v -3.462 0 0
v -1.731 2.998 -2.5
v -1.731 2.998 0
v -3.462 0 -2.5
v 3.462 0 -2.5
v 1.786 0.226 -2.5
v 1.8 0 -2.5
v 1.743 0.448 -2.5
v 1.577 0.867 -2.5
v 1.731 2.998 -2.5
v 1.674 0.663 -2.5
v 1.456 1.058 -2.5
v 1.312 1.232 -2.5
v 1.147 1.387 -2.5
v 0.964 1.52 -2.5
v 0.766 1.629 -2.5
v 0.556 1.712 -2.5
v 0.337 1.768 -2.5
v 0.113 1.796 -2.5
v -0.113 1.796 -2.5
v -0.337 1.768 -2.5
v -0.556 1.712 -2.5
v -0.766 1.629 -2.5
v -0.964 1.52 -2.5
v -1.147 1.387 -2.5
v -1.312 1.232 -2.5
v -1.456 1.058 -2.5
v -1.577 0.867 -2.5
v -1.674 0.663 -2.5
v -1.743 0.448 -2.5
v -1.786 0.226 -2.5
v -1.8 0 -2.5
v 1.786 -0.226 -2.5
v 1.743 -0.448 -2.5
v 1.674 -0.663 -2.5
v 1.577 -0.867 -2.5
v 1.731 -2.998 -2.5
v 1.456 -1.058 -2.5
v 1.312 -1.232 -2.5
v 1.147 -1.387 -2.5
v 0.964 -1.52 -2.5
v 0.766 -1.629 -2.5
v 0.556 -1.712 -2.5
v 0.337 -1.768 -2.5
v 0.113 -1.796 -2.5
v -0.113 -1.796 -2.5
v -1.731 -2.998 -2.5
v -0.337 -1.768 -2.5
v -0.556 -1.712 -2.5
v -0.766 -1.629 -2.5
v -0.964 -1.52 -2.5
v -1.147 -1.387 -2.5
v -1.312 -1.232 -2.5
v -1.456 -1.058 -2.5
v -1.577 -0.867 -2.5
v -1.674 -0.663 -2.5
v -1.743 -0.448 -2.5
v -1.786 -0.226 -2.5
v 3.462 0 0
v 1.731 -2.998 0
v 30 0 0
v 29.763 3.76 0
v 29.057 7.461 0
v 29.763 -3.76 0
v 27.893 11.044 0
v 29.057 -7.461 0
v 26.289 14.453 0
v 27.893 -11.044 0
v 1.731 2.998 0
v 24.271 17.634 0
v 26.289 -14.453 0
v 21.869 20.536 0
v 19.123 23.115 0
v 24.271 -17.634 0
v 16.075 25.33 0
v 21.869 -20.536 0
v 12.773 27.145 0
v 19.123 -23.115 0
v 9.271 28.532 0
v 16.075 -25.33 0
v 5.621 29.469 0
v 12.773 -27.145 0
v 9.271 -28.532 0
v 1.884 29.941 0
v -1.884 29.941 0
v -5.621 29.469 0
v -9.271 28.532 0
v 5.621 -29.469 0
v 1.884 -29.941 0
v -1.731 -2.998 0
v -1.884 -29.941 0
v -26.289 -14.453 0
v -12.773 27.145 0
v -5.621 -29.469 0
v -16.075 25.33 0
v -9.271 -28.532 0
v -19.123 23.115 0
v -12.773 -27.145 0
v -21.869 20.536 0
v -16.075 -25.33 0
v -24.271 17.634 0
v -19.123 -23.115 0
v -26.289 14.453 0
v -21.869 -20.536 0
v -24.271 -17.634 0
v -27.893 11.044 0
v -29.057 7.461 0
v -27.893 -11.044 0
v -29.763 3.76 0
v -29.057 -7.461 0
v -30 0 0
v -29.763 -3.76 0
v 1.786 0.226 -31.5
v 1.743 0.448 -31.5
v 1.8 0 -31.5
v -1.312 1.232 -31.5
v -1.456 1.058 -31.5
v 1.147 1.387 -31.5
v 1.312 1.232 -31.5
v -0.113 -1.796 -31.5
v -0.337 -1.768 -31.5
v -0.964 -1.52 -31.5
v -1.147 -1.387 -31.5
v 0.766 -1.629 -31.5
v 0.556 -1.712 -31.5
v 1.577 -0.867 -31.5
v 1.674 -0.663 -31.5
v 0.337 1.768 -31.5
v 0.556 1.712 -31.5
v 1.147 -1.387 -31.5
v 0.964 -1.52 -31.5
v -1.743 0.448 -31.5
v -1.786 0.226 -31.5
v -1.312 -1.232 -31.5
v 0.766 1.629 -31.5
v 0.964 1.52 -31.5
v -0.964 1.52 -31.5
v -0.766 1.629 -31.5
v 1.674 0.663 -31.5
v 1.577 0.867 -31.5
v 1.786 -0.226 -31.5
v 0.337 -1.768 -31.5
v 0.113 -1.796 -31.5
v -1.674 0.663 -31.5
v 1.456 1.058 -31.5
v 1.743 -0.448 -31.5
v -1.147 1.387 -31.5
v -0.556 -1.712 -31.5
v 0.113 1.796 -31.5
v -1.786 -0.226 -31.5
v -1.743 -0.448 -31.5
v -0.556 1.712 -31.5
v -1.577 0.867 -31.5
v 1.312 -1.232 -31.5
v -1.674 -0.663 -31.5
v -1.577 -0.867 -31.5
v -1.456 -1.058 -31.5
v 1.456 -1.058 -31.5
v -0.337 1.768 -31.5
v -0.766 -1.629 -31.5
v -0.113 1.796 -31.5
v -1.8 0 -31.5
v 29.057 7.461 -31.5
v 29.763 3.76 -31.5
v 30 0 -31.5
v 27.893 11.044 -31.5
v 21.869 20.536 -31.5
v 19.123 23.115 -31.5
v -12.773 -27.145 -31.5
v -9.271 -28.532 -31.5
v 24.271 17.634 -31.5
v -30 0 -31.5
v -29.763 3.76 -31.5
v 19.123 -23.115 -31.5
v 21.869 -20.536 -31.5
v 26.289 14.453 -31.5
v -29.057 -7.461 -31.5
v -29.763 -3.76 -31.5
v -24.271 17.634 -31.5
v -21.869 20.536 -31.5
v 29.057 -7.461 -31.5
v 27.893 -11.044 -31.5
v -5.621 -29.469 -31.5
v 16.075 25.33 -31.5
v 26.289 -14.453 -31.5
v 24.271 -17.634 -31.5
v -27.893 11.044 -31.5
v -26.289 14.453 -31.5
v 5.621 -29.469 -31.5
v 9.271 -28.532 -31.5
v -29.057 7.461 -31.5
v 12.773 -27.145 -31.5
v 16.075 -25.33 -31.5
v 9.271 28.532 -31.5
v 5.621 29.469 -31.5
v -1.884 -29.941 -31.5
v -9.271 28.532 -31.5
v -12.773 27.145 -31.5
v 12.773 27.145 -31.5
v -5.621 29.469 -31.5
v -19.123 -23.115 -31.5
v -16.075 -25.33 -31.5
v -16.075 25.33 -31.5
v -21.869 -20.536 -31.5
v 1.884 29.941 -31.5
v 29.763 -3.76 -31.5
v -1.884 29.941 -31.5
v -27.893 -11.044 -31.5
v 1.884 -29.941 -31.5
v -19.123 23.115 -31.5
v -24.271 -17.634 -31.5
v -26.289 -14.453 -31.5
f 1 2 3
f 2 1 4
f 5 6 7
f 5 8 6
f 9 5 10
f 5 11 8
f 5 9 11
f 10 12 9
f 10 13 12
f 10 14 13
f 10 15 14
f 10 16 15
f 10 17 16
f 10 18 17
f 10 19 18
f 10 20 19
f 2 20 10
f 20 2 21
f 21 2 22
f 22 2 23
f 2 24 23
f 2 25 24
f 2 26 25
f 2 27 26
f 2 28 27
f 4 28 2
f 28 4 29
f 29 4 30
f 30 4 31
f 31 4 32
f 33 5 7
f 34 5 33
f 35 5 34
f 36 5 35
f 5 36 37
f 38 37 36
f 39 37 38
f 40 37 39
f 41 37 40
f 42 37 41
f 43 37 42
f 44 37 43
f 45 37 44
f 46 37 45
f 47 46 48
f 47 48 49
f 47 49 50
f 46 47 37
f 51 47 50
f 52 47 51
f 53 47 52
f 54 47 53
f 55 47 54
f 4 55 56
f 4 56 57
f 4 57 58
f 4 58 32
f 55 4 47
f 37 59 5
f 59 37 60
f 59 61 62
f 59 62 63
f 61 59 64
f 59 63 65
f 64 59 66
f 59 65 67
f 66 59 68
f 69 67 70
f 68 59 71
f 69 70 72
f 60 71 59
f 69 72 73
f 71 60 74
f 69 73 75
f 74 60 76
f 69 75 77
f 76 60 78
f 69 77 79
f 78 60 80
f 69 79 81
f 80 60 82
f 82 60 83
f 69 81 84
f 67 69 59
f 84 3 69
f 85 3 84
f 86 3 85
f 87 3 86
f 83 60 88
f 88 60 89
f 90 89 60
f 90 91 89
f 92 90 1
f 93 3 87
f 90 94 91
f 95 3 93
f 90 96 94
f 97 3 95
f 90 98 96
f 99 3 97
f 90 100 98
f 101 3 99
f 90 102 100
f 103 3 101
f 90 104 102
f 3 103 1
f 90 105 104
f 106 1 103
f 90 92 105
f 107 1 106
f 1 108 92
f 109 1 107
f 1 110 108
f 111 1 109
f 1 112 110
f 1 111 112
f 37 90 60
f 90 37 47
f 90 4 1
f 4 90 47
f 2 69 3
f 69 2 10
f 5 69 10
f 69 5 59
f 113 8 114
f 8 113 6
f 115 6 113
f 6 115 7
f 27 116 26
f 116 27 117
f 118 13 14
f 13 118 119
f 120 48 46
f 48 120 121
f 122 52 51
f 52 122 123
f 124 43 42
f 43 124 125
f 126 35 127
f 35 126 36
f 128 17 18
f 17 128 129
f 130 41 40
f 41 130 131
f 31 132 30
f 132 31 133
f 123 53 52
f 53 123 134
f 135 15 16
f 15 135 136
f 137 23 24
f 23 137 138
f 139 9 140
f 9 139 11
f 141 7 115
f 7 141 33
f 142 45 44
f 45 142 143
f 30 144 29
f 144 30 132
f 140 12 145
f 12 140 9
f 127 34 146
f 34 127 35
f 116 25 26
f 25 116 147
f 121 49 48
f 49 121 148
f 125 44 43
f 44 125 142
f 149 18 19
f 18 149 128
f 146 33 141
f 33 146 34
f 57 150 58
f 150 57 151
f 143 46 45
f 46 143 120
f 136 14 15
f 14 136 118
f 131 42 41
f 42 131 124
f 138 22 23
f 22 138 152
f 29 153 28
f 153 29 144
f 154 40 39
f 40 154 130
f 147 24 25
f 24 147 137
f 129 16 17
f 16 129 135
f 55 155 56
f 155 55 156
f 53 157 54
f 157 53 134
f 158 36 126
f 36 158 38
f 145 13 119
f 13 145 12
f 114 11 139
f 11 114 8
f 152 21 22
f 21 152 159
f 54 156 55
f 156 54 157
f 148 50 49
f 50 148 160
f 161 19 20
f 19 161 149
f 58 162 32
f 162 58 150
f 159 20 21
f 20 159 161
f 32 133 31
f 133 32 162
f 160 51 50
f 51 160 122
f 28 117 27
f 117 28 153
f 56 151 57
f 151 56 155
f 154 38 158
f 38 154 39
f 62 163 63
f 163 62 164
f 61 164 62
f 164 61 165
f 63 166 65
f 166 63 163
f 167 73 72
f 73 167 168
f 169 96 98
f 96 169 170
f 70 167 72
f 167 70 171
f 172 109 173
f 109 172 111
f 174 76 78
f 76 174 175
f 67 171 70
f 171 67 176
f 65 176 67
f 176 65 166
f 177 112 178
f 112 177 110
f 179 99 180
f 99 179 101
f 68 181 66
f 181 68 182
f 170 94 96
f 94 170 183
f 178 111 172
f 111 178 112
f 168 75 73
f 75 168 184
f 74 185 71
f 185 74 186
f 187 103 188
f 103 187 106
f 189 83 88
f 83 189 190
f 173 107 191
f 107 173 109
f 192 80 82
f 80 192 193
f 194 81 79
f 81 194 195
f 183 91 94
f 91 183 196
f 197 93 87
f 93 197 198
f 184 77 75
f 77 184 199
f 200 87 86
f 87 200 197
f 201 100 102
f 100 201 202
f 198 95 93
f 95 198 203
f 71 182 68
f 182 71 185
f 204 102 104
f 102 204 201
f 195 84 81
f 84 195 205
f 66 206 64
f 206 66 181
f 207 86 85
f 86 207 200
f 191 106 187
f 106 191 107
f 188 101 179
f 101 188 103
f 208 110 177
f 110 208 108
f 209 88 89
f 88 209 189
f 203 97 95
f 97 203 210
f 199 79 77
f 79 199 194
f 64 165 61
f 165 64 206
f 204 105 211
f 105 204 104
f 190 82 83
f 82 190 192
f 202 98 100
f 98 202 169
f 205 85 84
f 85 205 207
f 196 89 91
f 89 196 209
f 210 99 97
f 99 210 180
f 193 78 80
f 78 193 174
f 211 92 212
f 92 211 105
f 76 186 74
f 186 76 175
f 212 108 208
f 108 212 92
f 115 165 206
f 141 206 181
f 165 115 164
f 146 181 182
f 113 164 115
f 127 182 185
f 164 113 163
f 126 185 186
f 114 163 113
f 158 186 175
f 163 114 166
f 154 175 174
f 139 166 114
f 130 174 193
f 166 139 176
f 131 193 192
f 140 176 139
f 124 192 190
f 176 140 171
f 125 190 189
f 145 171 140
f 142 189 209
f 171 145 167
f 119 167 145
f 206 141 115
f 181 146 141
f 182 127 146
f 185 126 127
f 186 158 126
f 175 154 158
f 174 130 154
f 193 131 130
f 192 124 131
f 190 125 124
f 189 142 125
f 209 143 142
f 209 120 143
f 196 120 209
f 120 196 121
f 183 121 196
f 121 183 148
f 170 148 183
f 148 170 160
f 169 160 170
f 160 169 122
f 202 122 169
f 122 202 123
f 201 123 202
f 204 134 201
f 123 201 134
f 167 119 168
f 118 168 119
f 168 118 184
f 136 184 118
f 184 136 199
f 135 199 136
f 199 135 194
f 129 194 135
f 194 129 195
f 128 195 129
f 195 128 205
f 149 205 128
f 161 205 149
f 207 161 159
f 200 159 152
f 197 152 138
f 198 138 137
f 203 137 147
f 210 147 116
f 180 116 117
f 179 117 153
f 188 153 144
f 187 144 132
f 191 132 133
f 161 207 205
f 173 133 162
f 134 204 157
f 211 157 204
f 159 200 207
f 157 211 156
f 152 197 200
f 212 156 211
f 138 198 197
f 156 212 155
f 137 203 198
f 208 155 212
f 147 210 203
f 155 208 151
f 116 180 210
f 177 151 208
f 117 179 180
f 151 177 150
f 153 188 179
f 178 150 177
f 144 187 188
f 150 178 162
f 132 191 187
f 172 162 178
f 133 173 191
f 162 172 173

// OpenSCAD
$fn = 50;

difference() {
	union() {
		translate(v = [0, 0, -31.5]) {
			cylinder(h = 31.5, r = 30.0);
		}
	}
	union() {
		translate(v = [0, 0, 0]) {
			rotate(a = [0, 0, 0]) {
				difference() {
					union() {
						translate(v = [0, 0, -2.5]) {
							linear_extrude(height = 2.5) {
								polygon(points = [[3.4619999999999997, 0.0], [1.7310000000000003, 2.9981799479017264], [-1.7309999999999992, 2.9981799479017264], [-3.4619999999999997, 4.2397272186481365e-16], [-1.7310000000000014, -2.998179947901726], [1.7309999999999977, -2.9981799479017277]]);
							}
						}
					}
					union();
				}
			}
		}
		#translate(v = [0, 0, -100.0]) {
			cylinder(h = 200, r = 1.8);
		}
	}
}
